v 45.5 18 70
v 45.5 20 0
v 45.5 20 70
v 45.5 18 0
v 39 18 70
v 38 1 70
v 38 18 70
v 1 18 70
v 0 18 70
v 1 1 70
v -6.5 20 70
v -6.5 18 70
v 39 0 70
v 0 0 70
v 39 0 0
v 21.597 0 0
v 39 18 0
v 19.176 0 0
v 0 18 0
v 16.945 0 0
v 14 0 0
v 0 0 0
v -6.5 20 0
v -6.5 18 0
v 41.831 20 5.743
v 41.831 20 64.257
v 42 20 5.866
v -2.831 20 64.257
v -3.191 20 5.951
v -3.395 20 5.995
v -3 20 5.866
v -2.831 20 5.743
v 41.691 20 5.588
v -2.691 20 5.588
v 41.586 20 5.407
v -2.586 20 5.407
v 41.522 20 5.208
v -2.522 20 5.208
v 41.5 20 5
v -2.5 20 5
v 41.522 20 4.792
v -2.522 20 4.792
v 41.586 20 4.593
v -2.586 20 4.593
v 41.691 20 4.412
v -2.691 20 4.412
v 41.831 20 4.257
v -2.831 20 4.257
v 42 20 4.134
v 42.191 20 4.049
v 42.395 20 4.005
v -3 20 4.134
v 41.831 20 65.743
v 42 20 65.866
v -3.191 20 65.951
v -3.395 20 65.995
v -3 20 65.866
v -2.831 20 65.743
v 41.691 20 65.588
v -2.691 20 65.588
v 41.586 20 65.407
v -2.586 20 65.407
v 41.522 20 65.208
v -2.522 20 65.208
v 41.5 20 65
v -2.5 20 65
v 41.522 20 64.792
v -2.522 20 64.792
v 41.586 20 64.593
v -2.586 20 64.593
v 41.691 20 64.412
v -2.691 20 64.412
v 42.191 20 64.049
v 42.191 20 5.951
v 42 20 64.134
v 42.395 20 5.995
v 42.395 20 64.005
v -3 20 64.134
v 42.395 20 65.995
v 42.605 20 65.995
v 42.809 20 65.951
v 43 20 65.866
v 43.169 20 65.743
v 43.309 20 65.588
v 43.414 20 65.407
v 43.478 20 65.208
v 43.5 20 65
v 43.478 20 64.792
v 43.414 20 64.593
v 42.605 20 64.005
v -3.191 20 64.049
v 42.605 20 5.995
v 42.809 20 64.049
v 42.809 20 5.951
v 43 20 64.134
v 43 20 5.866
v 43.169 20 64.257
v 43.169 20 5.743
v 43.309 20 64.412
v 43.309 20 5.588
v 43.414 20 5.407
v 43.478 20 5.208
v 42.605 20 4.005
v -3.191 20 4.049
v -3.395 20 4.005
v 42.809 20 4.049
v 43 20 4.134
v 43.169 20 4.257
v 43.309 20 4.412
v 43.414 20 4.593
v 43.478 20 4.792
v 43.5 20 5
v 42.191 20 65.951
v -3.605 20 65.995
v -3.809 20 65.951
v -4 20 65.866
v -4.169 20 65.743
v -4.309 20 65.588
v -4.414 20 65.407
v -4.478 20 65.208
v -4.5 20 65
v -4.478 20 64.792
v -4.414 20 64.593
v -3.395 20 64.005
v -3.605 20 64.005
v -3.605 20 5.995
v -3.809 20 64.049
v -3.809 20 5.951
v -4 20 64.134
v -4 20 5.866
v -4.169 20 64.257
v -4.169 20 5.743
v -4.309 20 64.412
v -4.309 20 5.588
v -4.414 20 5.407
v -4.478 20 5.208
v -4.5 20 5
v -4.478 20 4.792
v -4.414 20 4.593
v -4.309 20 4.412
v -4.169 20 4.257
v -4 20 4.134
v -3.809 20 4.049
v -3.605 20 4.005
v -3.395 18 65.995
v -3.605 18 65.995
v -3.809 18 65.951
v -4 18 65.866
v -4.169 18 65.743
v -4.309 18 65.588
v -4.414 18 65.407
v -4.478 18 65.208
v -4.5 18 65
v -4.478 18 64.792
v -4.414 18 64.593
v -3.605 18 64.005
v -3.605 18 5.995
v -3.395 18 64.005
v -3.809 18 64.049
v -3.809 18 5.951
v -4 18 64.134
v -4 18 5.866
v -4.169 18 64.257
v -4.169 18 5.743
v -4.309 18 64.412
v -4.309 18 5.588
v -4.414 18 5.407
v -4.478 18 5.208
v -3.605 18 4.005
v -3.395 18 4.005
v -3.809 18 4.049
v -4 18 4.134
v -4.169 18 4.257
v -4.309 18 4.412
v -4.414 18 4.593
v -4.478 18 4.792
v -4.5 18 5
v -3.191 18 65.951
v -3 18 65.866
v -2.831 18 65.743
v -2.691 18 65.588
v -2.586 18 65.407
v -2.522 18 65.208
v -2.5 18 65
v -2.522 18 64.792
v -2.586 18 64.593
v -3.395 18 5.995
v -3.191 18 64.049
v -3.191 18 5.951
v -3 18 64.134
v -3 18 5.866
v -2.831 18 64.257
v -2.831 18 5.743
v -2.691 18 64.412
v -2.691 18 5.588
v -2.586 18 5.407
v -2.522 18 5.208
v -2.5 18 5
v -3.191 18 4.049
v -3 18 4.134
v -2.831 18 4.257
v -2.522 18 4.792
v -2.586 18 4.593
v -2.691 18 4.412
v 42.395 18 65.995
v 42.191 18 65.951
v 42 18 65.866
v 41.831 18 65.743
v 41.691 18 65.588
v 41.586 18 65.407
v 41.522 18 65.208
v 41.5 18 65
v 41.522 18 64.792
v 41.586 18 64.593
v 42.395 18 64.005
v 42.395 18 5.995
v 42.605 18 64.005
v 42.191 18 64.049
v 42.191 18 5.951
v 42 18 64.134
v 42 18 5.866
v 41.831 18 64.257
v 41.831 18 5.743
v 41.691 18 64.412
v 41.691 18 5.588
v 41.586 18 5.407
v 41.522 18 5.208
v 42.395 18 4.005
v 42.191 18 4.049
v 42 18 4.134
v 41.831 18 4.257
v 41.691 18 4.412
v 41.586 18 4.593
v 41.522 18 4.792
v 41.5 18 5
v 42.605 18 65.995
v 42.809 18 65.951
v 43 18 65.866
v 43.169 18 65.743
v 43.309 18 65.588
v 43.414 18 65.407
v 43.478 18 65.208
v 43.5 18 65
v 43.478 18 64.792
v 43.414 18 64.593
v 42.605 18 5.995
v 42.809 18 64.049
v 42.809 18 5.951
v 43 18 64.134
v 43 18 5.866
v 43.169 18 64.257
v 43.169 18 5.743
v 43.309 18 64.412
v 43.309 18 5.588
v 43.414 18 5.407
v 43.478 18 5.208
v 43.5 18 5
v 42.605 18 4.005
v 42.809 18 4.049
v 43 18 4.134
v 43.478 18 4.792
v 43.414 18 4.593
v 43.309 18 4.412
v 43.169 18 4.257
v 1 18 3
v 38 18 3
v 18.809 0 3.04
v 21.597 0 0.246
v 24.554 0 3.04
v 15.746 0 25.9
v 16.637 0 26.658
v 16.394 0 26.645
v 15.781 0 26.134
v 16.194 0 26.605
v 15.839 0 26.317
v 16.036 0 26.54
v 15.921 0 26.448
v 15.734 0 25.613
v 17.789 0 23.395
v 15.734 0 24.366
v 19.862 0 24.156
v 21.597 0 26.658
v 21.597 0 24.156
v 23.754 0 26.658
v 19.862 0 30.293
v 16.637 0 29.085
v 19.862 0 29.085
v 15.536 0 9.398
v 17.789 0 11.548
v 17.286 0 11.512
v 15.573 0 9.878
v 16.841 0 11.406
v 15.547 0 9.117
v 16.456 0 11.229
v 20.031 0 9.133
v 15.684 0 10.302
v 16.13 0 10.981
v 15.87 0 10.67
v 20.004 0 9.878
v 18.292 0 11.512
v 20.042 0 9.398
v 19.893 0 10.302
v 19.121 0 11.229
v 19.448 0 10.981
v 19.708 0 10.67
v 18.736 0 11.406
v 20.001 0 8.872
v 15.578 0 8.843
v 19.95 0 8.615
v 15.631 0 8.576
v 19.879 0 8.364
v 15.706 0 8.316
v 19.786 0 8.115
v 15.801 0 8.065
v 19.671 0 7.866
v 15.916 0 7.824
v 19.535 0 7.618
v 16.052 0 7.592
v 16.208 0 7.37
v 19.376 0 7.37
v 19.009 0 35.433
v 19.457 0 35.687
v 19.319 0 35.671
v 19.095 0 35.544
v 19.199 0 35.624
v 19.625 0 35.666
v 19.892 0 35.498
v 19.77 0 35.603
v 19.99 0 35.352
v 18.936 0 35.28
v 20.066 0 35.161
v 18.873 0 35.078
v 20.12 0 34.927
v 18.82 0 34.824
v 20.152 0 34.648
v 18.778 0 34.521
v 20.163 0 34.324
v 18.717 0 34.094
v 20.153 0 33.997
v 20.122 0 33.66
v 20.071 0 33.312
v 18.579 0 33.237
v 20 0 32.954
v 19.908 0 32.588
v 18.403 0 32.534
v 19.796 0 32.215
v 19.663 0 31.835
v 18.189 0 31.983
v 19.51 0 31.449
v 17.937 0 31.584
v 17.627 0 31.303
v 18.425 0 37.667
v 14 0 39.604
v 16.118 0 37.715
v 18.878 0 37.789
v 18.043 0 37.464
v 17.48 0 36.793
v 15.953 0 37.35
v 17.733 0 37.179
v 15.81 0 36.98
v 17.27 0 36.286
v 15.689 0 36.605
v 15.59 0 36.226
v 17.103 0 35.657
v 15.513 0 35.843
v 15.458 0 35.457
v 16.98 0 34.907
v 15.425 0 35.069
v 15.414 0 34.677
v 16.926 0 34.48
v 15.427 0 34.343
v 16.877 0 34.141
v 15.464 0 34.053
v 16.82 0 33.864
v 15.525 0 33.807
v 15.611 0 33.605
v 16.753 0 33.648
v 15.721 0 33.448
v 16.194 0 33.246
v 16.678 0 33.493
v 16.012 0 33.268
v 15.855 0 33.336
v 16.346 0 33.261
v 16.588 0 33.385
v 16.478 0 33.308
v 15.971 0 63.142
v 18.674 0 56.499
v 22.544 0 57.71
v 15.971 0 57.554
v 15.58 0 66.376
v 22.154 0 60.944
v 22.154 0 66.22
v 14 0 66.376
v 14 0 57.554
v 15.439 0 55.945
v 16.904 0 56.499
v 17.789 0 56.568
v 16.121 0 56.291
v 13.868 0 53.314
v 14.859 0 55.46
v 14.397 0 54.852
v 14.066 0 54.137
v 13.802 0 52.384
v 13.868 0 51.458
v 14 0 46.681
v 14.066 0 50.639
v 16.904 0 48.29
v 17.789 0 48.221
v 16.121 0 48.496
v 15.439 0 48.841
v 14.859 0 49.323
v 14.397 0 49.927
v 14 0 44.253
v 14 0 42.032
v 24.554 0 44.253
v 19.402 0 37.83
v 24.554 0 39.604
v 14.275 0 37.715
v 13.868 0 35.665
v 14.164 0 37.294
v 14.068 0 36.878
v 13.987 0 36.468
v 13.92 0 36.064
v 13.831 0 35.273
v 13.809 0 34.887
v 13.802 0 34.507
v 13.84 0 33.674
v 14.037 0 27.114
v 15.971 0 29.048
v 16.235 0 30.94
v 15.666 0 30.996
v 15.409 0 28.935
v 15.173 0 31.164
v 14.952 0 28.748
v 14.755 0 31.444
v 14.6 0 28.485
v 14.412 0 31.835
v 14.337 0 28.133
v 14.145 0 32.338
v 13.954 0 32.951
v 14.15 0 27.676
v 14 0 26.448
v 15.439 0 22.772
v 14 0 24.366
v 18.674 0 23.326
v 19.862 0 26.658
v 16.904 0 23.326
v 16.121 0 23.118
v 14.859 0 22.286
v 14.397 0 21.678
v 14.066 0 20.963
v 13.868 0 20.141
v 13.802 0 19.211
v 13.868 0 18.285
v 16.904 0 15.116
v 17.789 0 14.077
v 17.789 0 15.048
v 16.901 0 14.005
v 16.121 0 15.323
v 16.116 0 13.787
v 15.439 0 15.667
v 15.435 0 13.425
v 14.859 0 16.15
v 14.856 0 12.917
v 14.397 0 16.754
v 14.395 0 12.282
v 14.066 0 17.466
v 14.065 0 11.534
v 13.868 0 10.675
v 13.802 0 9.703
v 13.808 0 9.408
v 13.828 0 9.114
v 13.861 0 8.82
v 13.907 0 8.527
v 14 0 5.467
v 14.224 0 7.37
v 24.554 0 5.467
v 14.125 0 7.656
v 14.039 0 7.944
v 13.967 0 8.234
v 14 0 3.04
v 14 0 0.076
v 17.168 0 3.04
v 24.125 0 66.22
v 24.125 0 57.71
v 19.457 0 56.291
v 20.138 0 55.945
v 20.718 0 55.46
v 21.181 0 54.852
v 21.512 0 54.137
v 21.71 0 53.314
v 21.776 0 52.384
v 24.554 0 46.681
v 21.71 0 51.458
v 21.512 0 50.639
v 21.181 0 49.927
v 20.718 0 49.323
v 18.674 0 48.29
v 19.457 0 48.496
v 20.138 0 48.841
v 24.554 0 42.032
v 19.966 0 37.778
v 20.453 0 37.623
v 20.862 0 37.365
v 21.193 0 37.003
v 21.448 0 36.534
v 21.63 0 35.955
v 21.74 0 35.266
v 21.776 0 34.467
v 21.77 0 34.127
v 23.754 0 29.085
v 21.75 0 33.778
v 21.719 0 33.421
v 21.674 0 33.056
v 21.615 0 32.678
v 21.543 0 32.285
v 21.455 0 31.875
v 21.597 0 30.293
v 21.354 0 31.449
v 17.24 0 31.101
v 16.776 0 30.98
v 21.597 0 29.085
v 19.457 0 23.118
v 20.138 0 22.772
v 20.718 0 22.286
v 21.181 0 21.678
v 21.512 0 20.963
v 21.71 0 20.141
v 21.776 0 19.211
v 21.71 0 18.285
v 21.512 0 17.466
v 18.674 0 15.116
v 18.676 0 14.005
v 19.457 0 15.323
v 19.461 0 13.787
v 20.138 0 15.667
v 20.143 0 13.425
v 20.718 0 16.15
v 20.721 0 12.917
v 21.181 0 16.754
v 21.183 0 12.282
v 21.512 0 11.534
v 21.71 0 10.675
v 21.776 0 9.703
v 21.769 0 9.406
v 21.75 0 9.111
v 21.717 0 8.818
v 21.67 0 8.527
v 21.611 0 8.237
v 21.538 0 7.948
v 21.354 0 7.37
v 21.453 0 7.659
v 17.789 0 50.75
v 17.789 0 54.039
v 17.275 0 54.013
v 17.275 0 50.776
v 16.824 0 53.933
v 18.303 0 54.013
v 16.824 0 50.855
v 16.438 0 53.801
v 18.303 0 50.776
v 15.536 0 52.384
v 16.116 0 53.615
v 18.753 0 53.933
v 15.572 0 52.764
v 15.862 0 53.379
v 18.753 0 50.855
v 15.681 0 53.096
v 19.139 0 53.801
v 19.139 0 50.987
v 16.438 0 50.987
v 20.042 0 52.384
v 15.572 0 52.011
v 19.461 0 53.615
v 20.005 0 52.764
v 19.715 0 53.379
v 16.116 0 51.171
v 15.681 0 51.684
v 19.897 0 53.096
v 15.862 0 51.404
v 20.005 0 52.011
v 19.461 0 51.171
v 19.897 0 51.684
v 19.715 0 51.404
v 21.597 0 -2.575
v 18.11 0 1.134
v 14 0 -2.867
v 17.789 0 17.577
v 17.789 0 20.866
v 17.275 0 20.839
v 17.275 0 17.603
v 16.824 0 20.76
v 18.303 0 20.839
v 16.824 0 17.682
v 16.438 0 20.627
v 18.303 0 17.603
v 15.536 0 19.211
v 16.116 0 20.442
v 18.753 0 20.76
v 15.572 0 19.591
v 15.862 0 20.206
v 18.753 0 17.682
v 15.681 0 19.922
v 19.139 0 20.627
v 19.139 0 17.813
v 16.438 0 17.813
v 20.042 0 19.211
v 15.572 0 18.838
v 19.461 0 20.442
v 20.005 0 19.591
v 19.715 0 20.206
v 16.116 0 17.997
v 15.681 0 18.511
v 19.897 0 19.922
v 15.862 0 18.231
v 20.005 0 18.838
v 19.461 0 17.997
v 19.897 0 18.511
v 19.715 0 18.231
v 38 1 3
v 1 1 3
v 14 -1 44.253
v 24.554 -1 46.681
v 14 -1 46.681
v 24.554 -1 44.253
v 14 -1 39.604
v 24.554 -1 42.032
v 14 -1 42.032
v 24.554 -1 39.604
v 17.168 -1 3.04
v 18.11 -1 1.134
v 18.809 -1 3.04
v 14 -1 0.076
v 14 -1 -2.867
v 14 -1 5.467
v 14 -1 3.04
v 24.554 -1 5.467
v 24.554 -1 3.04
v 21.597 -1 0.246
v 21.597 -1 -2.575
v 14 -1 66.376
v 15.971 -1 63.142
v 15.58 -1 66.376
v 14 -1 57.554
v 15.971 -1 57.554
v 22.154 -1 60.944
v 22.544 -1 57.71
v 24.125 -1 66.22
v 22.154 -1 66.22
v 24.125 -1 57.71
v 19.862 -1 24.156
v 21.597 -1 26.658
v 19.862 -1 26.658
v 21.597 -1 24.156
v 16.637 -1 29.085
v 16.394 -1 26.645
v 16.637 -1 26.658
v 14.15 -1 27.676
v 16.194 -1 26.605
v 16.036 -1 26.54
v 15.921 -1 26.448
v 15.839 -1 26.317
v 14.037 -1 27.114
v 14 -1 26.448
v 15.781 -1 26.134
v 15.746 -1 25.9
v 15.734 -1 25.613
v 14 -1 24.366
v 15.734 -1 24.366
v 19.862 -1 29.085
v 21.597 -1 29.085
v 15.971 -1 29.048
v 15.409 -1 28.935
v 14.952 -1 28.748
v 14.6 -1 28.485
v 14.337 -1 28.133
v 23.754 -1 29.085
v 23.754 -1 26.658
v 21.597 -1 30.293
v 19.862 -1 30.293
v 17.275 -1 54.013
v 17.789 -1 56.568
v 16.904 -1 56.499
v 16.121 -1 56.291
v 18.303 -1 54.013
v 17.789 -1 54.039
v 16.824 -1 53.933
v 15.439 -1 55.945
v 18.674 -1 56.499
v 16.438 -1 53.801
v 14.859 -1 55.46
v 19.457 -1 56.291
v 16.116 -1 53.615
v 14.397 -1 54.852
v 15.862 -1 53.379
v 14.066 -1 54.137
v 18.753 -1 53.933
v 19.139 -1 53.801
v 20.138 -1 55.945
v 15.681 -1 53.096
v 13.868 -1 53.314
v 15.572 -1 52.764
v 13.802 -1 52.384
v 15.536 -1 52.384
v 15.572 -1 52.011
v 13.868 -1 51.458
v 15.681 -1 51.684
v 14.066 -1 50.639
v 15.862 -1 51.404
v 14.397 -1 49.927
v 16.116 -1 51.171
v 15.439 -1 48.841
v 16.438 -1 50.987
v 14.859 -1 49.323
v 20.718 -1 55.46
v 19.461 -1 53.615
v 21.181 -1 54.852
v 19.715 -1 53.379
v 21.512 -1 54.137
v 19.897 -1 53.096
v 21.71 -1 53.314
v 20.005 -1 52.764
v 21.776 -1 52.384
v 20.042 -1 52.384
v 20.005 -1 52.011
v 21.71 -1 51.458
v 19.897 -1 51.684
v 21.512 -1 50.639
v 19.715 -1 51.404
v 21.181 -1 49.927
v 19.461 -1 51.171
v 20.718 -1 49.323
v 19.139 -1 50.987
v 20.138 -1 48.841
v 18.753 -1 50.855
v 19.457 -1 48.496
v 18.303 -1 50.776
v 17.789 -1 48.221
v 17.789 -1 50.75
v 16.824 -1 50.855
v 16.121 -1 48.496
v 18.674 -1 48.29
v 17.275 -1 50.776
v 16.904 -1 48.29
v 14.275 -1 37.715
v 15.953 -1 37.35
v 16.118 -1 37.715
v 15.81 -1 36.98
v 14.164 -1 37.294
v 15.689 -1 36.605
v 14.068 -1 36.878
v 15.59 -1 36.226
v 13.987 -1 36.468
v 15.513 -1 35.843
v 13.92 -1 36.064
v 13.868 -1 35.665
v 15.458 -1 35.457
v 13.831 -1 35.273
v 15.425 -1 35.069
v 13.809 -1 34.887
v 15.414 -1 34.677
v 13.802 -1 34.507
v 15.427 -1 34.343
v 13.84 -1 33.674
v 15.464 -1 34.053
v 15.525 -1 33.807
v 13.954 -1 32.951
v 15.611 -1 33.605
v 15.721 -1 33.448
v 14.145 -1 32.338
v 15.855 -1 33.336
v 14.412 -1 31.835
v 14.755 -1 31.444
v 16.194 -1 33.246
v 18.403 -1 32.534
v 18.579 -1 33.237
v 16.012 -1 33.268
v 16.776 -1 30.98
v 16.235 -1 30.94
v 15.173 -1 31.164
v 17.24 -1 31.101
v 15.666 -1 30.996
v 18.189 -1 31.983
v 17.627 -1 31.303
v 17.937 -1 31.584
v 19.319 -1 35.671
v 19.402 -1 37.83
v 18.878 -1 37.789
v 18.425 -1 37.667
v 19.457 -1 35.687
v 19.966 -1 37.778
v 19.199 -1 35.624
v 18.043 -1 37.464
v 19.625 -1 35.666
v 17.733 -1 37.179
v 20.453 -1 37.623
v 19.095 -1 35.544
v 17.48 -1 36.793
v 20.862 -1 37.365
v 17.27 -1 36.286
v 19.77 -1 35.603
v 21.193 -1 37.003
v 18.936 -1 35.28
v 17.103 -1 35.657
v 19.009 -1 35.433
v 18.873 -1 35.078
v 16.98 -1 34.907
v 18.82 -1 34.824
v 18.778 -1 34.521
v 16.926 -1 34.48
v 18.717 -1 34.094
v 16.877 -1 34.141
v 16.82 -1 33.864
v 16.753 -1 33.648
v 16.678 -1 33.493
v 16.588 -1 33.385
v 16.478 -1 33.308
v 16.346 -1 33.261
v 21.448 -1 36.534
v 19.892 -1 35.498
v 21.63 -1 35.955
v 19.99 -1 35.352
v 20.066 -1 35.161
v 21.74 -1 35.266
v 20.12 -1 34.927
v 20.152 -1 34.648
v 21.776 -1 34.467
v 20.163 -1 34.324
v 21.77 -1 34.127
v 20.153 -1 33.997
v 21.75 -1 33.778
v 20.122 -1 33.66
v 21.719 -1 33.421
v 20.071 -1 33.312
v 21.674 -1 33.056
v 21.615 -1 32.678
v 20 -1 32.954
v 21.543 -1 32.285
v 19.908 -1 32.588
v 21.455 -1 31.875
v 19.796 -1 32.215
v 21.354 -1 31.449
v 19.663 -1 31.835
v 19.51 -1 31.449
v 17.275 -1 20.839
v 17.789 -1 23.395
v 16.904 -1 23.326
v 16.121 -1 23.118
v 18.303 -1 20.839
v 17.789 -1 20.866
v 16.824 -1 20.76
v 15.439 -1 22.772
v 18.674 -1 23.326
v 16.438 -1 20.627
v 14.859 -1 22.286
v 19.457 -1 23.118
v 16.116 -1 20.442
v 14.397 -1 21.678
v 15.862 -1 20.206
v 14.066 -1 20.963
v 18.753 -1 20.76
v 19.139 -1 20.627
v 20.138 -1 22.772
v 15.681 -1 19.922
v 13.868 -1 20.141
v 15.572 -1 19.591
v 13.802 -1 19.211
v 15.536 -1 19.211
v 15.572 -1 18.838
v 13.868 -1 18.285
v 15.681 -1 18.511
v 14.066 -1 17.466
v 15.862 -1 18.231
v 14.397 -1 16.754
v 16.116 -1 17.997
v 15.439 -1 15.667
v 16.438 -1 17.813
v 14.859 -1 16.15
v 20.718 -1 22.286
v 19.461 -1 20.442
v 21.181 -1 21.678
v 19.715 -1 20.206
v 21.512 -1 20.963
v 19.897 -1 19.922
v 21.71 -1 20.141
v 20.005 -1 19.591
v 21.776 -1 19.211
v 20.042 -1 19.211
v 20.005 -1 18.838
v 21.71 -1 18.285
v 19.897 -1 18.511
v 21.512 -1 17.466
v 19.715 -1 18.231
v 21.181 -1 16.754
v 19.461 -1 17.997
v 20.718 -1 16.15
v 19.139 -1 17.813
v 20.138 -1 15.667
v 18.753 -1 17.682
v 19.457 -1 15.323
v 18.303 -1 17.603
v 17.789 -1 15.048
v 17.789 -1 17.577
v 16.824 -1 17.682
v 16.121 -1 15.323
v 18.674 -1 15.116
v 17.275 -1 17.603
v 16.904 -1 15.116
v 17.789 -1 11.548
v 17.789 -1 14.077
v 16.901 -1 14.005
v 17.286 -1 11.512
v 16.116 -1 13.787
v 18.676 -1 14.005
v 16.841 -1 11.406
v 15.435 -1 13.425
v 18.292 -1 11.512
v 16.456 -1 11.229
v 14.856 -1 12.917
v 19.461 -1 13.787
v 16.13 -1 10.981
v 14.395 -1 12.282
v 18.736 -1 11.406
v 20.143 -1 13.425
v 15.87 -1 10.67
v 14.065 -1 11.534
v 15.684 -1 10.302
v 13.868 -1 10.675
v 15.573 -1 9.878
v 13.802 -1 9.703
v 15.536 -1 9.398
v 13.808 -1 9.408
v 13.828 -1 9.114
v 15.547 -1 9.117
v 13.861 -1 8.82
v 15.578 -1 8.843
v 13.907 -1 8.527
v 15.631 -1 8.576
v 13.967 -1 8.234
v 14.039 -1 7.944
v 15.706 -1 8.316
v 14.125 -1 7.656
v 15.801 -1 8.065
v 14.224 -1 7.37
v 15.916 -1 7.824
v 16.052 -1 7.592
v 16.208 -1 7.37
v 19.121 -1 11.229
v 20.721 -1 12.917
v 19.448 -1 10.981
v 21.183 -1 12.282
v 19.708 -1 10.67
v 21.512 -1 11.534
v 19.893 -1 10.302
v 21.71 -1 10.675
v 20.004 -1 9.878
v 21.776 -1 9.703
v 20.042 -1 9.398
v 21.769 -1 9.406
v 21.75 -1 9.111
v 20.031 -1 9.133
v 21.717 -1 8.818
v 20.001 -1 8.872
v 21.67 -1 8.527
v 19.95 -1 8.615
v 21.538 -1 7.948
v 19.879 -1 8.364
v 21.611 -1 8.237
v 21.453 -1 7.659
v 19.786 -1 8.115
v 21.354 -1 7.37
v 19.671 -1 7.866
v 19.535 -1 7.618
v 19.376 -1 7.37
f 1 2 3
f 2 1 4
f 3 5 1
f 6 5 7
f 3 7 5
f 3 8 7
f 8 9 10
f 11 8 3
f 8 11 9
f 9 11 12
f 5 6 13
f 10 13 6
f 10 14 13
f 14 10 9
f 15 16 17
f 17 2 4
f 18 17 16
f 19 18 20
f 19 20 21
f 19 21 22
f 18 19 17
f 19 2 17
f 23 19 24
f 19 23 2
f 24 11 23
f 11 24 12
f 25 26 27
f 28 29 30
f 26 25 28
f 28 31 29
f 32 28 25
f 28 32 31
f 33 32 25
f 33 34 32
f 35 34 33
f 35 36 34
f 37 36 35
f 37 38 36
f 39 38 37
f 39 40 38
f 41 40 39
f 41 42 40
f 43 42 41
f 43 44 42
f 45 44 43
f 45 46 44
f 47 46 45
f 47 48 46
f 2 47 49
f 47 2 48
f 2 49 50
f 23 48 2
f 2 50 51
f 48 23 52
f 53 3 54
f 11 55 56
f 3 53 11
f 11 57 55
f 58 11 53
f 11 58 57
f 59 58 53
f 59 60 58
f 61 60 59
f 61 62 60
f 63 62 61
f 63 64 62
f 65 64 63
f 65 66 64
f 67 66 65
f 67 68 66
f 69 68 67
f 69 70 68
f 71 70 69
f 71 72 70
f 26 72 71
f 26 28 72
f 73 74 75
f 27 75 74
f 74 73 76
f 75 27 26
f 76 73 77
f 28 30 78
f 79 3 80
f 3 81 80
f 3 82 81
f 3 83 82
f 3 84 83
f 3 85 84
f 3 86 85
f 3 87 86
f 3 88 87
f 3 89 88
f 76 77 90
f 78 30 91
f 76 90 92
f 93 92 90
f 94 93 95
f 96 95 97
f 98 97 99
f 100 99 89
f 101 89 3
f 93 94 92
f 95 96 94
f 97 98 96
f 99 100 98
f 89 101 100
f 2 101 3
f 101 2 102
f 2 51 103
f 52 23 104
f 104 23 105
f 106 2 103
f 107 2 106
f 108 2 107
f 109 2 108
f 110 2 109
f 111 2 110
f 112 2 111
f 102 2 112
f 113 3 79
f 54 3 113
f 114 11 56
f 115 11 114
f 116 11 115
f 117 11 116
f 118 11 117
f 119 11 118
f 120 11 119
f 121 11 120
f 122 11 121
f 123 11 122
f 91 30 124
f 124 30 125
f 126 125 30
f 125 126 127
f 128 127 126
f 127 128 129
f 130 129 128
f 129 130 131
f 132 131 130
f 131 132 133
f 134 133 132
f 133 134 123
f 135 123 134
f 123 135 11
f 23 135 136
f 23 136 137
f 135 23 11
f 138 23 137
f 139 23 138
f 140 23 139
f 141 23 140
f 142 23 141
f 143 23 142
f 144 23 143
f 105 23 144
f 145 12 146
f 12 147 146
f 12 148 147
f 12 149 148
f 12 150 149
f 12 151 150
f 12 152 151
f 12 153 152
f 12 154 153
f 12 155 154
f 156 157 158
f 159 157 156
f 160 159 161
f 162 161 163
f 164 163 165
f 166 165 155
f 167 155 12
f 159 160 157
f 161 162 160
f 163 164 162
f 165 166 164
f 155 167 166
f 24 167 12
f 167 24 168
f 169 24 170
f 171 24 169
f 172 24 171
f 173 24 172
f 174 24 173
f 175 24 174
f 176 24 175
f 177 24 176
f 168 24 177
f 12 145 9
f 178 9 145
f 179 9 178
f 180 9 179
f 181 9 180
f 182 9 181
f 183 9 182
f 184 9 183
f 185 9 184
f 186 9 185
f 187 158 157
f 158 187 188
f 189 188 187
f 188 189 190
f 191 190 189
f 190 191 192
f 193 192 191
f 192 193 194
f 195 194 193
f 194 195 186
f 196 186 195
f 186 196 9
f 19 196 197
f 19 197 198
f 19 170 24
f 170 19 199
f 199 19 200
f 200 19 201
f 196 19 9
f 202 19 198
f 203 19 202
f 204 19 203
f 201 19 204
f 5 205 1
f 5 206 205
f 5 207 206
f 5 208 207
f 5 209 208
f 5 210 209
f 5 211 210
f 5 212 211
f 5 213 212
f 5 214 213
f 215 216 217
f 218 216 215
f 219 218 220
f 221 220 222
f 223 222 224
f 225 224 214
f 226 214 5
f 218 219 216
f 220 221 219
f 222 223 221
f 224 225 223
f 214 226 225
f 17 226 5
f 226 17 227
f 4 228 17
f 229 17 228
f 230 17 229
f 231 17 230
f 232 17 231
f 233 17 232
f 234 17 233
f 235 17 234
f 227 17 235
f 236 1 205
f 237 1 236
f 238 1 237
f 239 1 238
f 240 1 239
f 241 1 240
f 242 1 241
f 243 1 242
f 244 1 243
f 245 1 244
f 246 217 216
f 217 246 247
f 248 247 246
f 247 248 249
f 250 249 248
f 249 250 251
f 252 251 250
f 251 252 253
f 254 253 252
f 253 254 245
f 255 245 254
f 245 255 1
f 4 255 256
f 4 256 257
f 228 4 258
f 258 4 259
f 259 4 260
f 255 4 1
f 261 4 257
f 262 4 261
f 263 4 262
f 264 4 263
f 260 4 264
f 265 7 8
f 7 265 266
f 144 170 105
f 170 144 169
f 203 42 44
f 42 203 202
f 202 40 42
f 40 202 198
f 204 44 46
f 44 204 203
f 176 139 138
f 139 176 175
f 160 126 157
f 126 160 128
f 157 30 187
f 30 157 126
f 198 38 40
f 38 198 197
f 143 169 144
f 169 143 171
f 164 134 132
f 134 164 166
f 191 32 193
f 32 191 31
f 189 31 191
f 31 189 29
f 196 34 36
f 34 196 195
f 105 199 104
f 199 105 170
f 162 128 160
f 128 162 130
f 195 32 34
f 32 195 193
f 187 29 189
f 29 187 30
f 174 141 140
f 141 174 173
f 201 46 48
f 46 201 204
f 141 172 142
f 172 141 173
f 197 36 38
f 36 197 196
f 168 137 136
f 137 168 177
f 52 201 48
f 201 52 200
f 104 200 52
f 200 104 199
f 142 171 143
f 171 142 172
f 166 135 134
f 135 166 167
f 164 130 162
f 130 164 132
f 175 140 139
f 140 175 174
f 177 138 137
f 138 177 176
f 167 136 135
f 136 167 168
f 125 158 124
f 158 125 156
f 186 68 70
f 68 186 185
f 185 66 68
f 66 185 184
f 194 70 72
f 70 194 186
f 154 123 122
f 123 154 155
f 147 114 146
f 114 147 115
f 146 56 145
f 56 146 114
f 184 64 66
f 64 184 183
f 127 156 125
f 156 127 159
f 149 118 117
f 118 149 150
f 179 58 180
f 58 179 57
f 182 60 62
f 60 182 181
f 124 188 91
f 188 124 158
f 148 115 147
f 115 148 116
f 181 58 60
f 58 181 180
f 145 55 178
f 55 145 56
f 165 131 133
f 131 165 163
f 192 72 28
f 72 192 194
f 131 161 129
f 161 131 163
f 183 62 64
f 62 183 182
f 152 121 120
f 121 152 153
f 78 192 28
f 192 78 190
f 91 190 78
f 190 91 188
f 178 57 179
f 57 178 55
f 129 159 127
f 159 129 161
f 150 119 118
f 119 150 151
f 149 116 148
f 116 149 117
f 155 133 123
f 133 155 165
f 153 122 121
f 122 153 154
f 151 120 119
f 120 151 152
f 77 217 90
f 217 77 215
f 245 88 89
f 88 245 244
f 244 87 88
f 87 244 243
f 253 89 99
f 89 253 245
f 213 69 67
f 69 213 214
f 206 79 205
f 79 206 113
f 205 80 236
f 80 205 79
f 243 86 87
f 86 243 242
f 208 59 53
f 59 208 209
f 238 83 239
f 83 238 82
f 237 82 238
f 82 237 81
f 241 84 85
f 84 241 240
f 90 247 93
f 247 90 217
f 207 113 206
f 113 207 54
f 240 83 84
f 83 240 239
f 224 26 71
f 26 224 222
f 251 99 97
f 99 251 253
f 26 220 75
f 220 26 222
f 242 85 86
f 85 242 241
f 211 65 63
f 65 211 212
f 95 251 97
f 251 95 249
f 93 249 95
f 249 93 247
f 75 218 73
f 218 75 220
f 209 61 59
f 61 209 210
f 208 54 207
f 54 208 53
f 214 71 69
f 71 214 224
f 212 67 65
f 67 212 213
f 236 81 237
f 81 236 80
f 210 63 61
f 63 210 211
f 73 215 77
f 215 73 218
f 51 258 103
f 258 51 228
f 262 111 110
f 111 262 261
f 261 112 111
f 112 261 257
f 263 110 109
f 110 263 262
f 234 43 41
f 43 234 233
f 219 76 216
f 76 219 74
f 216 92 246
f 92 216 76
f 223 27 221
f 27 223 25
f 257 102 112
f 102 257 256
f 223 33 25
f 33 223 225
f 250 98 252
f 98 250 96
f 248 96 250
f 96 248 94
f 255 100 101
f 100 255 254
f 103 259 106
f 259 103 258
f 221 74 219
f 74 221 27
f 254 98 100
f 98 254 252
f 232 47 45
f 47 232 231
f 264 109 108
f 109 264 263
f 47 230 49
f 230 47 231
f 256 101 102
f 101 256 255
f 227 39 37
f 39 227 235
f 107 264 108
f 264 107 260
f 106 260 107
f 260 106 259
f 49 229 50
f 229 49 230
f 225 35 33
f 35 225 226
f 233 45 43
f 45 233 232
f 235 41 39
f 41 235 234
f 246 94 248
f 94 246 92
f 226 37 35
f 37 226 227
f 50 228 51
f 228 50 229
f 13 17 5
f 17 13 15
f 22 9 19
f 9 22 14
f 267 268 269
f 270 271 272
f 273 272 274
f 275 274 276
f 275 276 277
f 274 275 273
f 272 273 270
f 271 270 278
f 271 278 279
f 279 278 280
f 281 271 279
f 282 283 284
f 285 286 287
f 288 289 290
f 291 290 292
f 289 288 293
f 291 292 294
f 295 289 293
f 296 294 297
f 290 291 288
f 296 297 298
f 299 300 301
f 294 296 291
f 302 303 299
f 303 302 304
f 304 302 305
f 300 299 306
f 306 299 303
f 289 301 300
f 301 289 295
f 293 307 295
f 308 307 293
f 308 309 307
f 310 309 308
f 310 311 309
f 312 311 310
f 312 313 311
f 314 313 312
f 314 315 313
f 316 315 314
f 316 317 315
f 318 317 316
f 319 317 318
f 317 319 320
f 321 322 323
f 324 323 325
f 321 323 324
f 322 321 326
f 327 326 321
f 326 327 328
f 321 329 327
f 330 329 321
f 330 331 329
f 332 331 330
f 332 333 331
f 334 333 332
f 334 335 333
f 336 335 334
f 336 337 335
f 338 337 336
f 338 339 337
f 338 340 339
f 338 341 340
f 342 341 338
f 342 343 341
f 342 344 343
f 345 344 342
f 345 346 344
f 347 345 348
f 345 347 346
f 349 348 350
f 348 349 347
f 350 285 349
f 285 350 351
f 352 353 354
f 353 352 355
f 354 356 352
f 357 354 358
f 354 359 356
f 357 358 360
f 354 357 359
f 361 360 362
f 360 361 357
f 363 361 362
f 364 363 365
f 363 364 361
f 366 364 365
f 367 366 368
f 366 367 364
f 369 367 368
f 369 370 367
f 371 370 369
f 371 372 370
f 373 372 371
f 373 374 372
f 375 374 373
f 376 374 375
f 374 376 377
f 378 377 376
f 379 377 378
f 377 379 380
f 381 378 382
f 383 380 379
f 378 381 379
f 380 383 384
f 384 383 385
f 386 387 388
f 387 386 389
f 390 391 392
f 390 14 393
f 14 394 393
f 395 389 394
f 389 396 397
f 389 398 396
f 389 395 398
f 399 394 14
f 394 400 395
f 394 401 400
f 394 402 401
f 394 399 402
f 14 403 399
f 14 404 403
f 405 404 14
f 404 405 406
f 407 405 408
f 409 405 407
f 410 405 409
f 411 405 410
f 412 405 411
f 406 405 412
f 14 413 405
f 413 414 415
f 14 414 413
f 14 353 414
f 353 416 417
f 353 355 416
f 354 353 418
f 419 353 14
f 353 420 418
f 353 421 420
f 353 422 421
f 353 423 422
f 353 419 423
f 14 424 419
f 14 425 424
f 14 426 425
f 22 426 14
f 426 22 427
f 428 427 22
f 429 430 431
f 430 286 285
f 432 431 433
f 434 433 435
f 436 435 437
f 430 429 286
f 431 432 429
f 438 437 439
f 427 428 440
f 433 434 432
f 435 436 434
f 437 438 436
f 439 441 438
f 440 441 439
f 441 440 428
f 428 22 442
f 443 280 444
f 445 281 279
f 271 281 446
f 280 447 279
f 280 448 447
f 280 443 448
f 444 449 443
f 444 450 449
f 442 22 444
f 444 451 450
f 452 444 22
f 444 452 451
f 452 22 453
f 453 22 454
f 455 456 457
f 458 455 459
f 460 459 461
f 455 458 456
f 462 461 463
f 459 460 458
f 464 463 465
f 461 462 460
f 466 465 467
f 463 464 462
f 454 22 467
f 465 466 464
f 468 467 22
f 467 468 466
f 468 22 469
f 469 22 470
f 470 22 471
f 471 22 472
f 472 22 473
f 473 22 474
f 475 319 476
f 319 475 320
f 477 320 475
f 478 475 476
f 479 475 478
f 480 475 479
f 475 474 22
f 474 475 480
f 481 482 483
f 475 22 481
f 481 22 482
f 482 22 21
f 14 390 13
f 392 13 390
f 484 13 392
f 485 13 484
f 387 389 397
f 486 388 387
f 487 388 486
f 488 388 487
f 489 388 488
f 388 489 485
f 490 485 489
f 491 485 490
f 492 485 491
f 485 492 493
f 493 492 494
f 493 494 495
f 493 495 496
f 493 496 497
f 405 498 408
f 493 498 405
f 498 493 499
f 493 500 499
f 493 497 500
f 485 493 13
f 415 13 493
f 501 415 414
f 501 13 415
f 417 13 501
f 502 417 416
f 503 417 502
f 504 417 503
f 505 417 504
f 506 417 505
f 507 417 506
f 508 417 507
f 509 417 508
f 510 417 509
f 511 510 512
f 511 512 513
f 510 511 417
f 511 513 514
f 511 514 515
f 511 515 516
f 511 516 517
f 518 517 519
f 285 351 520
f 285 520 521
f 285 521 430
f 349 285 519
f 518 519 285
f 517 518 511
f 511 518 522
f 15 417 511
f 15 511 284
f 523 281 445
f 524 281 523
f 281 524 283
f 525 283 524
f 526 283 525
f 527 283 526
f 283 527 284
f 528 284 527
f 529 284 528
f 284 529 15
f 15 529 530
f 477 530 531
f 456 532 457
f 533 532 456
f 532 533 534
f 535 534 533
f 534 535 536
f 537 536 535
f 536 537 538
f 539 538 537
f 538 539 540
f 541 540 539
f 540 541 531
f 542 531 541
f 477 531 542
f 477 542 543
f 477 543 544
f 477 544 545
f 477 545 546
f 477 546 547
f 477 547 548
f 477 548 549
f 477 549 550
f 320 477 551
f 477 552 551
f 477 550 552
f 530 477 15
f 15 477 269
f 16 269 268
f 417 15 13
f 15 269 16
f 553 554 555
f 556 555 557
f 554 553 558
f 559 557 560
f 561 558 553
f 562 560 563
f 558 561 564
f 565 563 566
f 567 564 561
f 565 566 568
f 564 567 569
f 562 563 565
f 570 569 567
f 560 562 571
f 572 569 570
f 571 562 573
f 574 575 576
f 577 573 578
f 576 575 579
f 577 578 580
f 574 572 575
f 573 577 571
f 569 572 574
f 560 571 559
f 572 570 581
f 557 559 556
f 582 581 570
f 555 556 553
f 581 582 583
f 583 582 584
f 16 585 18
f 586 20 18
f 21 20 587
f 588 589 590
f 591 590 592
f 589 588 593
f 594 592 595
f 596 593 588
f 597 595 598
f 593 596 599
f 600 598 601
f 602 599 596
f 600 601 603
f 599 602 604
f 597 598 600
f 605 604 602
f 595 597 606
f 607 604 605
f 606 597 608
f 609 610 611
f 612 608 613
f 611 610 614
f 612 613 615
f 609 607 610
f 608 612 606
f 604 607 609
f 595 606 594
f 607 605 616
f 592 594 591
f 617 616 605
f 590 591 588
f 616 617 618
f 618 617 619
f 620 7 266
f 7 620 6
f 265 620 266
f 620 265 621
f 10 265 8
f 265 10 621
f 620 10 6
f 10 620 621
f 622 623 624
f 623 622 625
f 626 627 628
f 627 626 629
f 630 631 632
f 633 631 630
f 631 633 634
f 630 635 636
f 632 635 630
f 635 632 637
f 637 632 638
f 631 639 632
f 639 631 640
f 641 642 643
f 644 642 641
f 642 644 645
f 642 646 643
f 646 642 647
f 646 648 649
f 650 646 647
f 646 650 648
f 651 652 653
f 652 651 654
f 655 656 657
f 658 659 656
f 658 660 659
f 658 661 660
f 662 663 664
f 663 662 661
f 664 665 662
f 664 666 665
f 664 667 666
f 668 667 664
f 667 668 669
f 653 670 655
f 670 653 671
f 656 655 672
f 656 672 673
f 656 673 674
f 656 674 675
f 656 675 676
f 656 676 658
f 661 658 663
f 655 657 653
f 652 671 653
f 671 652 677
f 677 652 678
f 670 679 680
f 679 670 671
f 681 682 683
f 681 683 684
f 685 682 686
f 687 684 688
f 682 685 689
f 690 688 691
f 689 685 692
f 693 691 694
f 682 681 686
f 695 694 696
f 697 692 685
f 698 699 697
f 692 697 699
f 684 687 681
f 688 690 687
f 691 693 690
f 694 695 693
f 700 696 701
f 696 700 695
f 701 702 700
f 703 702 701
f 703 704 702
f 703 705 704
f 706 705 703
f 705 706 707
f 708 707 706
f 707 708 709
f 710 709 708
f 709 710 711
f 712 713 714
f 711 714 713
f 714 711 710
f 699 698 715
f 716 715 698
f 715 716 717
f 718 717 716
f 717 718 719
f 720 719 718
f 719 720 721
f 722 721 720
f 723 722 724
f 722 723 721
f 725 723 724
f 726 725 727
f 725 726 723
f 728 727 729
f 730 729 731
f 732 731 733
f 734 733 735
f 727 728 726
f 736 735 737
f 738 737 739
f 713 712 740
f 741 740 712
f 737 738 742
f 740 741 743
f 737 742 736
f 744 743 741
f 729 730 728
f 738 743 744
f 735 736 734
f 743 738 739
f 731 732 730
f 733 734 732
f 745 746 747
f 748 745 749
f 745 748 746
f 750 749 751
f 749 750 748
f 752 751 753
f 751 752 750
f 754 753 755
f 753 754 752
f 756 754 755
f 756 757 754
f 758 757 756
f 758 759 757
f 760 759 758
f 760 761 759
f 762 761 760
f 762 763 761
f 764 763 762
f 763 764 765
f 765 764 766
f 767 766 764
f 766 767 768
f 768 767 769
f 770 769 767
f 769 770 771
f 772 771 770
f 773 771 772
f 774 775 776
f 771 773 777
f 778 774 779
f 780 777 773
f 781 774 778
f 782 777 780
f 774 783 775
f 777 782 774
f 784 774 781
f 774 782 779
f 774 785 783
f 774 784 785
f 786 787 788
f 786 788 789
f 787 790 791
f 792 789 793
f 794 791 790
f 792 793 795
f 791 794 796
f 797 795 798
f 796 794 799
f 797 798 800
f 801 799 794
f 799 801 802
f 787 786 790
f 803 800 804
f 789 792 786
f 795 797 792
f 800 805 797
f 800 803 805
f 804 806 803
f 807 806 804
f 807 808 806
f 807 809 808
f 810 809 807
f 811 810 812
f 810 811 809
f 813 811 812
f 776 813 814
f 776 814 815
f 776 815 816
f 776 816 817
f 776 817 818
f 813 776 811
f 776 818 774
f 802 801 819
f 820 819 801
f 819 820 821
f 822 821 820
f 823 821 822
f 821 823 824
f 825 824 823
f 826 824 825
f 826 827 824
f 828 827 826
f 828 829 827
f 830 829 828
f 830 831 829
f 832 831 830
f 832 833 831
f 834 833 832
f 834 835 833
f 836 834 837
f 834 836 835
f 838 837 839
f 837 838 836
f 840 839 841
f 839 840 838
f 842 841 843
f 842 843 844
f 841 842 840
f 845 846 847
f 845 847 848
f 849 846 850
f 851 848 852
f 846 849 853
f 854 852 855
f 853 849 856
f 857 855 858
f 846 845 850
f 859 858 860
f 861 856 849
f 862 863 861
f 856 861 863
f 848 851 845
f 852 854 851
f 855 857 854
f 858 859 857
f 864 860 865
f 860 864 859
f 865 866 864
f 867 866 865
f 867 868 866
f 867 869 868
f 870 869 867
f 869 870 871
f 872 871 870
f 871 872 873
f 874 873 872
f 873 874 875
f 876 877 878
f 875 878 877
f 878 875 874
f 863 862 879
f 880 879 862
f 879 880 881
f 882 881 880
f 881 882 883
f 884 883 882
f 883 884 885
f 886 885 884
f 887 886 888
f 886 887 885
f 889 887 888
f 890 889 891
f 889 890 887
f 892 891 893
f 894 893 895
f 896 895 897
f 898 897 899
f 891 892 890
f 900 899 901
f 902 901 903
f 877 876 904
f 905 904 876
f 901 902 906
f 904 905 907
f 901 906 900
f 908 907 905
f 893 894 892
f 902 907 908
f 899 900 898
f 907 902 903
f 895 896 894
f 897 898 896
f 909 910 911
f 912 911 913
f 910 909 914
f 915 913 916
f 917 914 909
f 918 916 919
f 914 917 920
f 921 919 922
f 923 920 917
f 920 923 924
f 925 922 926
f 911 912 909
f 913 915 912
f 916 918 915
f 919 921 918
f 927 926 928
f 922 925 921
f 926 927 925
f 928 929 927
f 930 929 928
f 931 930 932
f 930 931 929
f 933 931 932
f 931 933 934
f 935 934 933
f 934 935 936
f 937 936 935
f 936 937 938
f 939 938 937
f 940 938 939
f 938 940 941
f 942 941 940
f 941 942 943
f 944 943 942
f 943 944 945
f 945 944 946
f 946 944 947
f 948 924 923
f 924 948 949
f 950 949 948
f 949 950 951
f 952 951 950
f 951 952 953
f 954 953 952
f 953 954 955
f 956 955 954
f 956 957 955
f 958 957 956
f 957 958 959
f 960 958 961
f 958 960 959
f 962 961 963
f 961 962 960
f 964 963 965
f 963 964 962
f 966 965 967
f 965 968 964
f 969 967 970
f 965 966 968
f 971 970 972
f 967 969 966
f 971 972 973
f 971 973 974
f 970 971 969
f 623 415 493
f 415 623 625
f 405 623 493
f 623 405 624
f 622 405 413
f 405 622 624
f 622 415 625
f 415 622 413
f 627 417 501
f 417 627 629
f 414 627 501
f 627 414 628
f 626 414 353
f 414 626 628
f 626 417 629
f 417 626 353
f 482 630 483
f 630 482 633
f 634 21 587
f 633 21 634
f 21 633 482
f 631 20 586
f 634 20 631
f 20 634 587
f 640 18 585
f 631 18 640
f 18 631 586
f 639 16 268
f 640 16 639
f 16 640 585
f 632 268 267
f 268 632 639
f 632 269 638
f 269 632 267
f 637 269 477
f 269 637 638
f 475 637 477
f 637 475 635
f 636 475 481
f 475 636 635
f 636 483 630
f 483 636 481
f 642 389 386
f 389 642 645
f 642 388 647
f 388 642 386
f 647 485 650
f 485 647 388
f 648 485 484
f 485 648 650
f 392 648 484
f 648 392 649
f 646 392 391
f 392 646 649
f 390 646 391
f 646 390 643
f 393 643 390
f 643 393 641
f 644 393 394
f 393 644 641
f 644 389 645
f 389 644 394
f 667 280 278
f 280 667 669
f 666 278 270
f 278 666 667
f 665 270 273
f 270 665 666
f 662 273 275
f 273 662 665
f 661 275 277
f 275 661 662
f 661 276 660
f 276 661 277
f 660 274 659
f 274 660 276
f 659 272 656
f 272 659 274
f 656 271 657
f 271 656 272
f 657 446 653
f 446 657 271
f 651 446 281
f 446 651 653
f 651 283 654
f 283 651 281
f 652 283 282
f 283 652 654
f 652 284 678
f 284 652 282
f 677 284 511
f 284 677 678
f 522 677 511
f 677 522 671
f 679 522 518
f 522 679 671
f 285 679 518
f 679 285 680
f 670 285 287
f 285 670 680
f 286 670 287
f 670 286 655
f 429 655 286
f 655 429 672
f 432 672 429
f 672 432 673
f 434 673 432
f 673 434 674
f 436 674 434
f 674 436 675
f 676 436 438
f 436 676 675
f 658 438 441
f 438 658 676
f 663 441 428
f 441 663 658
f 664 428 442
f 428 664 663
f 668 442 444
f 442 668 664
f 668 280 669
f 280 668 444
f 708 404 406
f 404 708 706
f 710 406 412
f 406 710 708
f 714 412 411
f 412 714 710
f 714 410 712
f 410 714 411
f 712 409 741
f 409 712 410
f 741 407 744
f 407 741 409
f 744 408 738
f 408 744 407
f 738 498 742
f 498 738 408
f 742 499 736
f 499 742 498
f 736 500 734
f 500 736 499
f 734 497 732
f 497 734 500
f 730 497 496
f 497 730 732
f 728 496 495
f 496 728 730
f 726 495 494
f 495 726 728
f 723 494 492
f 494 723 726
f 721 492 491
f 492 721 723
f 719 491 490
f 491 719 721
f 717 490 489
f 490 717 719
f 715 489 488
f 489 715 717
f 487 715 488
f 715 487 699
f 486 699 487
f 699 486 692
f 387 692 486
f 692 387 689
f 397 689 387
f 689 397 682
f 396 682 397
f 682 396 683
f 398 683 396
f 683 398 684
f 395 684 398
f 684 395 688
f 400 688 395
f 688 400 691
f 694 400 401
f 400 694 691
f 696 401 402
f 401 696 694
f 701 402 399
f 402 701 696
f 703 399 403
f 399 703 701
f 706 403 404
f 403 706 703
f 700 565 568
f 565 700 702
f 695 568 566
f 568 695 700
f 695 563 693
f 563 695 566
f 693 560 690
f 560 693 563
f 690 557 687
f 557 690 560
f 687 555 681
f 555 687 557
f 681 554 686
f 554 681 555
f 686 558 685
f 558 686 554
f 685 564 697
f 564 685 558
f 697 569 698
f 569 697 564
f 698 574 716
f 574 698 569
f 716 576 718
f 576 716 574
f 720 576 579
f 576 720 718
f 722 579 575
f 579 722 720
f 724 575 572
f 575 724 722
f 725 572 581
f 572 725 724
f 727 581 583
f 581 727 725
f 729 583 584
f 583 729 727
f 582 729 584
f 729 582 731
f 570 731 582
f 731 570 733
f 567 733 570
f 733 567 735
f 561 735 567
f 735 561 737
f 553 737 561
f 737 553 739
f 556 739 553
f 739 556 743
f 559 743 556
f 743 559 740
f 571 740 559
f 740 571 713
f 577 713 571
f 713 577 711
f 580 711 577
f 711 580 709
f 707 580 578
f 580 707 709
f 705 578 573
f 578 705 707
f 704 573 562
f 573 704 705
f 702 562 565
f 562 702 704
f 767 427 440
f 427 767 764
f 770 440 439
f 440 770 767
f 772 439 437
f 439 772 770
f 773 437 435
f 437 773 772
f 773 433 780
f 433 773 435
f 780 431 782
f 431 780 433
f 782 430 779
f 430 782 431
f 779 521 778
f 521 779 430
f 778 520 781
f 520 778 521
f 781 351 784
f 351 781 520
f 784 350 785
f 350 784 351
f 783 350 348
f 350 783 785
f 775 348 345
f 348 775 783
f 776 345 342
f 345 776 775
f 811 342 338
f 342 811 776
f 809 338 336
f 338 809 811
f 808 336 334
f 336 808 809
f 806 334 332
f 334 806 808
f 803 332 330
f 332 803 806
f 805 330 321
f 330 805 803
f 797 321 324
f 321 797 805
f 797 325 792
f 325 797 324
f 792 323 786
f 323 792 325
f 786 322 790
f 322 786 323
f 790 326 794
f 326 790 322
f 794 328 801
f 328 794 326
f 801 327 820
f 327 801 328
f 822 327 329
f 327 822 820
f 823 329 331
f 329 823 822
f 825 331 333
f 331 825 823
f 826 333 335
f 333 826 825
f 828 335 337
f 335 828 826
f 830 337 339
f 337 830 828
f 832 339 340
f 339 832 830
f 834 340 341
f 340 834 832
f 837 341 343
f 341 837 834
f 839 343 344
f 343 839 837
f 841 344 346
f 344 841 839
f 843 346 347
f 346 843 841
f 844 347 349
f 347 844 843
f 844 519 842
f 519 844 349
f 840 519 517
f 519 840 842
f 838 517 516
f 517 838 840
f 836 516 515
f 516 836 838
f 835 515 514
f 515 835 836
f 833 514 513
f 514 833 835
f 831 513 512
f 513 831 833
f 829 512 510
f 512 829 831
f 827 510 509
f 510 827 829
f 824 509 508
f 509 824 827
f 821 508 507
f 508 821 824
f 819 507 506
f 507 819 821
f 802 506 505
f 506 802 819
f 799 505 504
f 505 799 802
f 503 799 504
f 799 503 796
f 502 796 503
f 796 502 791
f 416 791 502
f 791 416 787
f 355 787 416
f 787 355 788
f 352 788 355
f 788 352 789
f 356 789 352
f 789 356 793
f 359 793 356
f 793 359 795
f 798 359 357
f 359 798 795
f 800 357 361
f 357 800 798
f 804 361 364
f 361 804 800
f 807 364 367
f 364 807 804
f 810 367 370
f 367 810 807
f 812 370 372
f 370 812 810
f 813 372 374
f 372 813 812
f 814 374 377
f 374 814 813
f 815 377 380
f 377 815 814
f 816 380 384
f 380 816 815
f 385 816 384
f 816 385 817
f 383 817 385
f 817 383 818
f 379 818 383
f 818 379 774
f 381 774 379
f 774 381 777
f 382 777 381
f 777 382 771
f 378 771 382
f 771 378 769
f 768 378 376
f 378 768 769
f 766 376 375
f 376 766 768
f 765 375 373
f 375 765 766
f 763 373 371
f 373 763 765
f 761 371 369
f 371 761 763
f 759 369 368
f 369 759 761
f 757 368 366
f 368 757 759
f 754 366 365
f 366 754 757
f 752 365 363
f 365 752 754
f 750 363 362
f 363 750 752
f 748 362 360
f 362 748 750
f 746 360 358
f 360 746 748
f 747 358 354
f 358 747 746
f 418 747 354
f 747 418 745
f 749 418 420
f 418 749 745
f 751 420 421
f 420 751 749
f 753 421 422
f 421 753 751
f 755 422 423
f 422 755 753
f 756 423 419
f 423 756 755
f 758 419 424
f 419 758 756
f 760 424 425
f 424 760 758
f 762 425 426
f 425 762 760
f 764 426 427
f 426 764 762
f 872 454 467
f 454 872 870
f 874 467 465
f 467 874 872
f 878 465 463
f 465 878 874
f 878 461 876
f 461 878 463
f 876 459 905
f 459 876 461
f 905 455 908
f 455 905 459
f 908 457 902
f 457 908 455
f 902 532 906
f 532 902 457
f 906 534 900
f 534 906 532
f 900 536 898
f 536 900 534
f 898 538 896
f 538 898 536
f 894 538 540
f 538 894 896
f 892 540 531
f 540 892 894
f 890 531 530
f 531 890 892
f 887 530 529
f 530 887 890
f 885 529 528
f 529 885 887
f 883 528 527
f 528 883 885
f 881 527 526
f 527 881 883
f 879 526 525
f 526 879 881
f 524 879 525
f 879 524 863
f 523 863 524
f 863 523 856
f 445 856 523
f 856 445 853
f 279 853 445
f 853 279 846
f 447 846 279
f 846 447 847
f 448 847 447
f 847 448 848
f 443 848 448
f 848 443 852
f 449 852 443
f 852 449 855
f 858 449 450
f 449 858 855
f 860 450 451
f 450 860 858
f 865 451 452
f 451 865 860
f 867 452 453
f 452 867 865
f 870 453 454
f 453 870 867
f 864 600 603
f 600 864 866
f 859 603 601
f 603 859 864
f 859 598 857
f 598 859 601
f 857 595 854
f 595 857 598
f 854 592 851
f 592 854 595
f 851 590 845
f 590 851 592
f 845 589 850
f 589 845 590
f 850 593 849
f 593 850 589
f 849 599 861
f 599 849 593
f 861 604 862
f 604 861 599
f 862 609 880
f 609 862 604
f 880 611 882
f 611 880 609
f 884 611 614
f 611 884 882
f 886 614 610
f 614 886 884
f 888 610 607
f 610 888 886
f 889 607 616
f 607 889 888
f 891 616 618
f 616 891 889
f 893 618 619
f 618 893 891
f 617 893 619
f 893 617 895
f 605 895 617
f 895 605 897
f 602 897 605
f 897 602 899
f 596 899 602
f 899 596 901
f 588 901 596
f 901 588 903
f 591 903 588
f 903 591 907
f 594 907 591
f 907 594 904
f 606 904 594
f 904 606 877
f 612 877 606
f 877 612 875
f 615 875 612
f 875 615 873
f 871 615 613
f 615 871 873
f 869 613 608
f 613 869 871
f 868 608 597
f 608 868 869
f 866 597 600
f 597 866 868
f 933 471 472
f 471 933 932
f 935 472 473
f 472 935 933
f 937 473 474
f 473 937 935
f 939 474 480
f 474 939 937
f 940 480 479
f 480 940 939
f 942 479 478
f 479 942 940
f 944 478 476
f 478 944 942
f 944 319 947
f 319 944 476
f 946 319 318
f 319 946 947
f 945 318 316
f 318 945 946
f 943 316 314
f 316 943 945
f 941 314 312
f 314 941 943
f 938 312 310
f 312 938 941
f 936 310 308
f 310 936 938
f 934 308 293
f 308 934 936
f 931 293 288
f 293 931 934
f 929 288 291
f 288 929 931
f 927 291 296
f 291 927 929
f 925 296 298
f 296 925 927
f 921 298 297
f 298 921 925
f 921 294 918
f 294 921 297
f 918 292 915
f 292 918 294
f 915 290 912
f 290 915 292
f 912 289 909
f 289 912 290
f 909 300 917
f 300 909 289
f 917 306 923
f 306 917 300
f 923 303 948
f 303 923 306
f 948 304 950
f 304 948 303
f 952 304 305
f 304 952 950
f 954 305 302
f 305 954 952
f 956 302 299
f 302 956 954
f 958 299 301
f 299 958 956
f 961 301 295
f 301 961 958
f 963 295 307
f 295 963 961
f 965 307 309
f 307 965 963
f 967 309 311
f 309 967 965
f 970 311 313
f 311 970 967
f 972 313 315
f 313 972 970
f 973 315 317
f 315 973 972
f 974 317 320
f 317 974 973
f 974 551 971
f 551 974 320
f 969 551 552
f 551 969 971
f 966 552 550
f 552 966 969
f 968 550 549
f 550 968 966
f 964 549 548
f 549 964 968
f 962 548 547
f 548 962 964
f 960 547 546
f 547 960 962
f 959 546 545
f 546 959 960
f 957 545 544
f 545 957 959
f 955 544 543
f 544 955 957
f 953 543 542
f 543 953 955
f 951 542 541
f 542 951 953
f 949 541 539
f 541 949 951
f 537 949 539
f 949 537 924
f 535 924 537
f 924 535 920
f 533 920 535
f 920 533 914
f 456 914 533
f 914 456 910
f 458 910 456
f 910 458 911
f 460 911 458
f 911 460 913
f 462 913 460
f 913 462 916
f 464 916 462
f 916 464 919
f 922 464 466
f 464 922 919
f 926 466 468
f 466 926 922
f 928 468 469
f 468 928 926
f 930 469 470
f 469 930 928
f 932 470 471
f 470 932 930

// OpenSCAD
$fn=30;

tw= 37;
td=17;
ttd=18;
th=70;


    box();
    translate([14,0,th - 3])
    rotate([90,90,0])
    linear_extrude(height=1)
    text("Zollstock", font = "FONTIN:style=Bold");


module box(){
union(){

translate([-(tw - 2 + 15-tw) / 2,ttd,0])
difference(){
cube([tw + 15,2,th]);
    
    translate([3,0,5])
    rotate([-90,0,0])
    cylinder(r=1,h=4);
    
    translate([3,0,th-5])
    rotate([-90,0,0])
    cylinder(r=1,h=4);
    
    translate([tw + 15-3,0,th-5])
    rotate([-90,0,0])
    cylinder(r=1,h=4);
    
    translate([tw+ 15 -3,0,5])
    rotate([-90,0,0])
    cylinder(r=1,h=4);
    
    


    }

    
difference(){

//box
cube([tw+2,ttd,th]);    
translate([1,1,3])
cube([tw,td,th]);
    
}

}

}


module circs(h,w,left){
    
    
difference(){
    cube([w,2,h]);
    
    if(left == false){
        translate([w,2,0])
        rotate([90,0,0])
        cylinder(r=w,h=3);
    
    translate([w,2,h])
    rotate([90,0,0])
    cylinder(r=w,h=3);
    }else{
        
    translate([0,2,0])
    rotate([90,0,0])
    cylinder(r=w,h=3);
    
    translate([0,2,h])
    rotate([90,0,0])
    cylinder(r=w,h=3);
    }
    
}
    
}
